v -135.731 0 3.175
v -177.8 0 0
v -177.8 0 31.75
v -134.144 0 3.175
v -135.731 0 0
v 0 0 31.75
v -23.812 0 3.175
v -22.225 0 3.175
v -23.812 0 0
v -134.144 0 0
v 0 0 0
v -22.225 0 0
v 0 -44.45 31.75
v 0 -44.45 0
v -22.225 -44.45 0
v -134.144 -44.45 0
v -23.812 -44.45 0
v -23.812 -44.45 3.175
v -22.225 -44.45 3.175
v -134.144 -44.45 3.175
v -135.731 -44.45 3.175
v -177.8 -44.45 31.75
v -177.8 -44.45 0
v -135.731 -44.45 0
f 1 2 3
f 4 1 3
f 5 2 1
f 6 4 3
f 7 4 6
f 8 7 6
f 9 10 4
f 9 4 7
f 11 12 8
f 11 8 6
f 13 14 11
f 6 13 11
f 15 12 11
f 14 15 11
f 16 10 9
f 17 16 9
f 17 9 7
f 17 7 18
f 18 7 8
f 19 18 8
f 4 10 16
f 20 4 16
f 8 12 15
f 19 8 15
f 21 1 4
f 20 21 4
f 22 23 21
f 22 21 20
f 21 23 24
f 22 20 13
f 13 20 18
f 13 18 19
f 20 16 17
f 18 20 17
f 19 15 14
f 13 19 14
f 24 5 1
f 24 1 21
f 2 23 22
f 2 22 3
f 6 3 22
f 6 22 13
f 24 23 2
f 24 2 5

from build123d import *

# Parameters (mm, degrees)
F0_W     = 177.8
F0_H     = 44.45
F1_DEPTH = 31.75
F2_W     = 1.5875
F2_H     = 44.45
F3_DEPTH = 3.175


with BuildPart() as f1:
    # F0 (on Top) → F1 (new body)
    with BuildSketch(Plane.XY):
        with Locations((-88.9, -22.225)):
            Rectangle(F0_W, F0_H)
    extrude(amount=F1_DEPTH)

    # F2 (on face) → F3 (cut)
    with BuildSketch(Plane(origin=(0, 0, 0), x_dir=(1, 0, 0), z_dir=(0, 0, -1))):
        with Locations((-23.01875, 22.225)):
            Rectangle(F2_W, F2_H)
        with Locations((-134.9375, 22.225)):
            Rectangle(F2_W, F2_H)
    extrude(amount=-F3_DEPTH, mode=Mode.SUBTRACT)


solid = f1.part
